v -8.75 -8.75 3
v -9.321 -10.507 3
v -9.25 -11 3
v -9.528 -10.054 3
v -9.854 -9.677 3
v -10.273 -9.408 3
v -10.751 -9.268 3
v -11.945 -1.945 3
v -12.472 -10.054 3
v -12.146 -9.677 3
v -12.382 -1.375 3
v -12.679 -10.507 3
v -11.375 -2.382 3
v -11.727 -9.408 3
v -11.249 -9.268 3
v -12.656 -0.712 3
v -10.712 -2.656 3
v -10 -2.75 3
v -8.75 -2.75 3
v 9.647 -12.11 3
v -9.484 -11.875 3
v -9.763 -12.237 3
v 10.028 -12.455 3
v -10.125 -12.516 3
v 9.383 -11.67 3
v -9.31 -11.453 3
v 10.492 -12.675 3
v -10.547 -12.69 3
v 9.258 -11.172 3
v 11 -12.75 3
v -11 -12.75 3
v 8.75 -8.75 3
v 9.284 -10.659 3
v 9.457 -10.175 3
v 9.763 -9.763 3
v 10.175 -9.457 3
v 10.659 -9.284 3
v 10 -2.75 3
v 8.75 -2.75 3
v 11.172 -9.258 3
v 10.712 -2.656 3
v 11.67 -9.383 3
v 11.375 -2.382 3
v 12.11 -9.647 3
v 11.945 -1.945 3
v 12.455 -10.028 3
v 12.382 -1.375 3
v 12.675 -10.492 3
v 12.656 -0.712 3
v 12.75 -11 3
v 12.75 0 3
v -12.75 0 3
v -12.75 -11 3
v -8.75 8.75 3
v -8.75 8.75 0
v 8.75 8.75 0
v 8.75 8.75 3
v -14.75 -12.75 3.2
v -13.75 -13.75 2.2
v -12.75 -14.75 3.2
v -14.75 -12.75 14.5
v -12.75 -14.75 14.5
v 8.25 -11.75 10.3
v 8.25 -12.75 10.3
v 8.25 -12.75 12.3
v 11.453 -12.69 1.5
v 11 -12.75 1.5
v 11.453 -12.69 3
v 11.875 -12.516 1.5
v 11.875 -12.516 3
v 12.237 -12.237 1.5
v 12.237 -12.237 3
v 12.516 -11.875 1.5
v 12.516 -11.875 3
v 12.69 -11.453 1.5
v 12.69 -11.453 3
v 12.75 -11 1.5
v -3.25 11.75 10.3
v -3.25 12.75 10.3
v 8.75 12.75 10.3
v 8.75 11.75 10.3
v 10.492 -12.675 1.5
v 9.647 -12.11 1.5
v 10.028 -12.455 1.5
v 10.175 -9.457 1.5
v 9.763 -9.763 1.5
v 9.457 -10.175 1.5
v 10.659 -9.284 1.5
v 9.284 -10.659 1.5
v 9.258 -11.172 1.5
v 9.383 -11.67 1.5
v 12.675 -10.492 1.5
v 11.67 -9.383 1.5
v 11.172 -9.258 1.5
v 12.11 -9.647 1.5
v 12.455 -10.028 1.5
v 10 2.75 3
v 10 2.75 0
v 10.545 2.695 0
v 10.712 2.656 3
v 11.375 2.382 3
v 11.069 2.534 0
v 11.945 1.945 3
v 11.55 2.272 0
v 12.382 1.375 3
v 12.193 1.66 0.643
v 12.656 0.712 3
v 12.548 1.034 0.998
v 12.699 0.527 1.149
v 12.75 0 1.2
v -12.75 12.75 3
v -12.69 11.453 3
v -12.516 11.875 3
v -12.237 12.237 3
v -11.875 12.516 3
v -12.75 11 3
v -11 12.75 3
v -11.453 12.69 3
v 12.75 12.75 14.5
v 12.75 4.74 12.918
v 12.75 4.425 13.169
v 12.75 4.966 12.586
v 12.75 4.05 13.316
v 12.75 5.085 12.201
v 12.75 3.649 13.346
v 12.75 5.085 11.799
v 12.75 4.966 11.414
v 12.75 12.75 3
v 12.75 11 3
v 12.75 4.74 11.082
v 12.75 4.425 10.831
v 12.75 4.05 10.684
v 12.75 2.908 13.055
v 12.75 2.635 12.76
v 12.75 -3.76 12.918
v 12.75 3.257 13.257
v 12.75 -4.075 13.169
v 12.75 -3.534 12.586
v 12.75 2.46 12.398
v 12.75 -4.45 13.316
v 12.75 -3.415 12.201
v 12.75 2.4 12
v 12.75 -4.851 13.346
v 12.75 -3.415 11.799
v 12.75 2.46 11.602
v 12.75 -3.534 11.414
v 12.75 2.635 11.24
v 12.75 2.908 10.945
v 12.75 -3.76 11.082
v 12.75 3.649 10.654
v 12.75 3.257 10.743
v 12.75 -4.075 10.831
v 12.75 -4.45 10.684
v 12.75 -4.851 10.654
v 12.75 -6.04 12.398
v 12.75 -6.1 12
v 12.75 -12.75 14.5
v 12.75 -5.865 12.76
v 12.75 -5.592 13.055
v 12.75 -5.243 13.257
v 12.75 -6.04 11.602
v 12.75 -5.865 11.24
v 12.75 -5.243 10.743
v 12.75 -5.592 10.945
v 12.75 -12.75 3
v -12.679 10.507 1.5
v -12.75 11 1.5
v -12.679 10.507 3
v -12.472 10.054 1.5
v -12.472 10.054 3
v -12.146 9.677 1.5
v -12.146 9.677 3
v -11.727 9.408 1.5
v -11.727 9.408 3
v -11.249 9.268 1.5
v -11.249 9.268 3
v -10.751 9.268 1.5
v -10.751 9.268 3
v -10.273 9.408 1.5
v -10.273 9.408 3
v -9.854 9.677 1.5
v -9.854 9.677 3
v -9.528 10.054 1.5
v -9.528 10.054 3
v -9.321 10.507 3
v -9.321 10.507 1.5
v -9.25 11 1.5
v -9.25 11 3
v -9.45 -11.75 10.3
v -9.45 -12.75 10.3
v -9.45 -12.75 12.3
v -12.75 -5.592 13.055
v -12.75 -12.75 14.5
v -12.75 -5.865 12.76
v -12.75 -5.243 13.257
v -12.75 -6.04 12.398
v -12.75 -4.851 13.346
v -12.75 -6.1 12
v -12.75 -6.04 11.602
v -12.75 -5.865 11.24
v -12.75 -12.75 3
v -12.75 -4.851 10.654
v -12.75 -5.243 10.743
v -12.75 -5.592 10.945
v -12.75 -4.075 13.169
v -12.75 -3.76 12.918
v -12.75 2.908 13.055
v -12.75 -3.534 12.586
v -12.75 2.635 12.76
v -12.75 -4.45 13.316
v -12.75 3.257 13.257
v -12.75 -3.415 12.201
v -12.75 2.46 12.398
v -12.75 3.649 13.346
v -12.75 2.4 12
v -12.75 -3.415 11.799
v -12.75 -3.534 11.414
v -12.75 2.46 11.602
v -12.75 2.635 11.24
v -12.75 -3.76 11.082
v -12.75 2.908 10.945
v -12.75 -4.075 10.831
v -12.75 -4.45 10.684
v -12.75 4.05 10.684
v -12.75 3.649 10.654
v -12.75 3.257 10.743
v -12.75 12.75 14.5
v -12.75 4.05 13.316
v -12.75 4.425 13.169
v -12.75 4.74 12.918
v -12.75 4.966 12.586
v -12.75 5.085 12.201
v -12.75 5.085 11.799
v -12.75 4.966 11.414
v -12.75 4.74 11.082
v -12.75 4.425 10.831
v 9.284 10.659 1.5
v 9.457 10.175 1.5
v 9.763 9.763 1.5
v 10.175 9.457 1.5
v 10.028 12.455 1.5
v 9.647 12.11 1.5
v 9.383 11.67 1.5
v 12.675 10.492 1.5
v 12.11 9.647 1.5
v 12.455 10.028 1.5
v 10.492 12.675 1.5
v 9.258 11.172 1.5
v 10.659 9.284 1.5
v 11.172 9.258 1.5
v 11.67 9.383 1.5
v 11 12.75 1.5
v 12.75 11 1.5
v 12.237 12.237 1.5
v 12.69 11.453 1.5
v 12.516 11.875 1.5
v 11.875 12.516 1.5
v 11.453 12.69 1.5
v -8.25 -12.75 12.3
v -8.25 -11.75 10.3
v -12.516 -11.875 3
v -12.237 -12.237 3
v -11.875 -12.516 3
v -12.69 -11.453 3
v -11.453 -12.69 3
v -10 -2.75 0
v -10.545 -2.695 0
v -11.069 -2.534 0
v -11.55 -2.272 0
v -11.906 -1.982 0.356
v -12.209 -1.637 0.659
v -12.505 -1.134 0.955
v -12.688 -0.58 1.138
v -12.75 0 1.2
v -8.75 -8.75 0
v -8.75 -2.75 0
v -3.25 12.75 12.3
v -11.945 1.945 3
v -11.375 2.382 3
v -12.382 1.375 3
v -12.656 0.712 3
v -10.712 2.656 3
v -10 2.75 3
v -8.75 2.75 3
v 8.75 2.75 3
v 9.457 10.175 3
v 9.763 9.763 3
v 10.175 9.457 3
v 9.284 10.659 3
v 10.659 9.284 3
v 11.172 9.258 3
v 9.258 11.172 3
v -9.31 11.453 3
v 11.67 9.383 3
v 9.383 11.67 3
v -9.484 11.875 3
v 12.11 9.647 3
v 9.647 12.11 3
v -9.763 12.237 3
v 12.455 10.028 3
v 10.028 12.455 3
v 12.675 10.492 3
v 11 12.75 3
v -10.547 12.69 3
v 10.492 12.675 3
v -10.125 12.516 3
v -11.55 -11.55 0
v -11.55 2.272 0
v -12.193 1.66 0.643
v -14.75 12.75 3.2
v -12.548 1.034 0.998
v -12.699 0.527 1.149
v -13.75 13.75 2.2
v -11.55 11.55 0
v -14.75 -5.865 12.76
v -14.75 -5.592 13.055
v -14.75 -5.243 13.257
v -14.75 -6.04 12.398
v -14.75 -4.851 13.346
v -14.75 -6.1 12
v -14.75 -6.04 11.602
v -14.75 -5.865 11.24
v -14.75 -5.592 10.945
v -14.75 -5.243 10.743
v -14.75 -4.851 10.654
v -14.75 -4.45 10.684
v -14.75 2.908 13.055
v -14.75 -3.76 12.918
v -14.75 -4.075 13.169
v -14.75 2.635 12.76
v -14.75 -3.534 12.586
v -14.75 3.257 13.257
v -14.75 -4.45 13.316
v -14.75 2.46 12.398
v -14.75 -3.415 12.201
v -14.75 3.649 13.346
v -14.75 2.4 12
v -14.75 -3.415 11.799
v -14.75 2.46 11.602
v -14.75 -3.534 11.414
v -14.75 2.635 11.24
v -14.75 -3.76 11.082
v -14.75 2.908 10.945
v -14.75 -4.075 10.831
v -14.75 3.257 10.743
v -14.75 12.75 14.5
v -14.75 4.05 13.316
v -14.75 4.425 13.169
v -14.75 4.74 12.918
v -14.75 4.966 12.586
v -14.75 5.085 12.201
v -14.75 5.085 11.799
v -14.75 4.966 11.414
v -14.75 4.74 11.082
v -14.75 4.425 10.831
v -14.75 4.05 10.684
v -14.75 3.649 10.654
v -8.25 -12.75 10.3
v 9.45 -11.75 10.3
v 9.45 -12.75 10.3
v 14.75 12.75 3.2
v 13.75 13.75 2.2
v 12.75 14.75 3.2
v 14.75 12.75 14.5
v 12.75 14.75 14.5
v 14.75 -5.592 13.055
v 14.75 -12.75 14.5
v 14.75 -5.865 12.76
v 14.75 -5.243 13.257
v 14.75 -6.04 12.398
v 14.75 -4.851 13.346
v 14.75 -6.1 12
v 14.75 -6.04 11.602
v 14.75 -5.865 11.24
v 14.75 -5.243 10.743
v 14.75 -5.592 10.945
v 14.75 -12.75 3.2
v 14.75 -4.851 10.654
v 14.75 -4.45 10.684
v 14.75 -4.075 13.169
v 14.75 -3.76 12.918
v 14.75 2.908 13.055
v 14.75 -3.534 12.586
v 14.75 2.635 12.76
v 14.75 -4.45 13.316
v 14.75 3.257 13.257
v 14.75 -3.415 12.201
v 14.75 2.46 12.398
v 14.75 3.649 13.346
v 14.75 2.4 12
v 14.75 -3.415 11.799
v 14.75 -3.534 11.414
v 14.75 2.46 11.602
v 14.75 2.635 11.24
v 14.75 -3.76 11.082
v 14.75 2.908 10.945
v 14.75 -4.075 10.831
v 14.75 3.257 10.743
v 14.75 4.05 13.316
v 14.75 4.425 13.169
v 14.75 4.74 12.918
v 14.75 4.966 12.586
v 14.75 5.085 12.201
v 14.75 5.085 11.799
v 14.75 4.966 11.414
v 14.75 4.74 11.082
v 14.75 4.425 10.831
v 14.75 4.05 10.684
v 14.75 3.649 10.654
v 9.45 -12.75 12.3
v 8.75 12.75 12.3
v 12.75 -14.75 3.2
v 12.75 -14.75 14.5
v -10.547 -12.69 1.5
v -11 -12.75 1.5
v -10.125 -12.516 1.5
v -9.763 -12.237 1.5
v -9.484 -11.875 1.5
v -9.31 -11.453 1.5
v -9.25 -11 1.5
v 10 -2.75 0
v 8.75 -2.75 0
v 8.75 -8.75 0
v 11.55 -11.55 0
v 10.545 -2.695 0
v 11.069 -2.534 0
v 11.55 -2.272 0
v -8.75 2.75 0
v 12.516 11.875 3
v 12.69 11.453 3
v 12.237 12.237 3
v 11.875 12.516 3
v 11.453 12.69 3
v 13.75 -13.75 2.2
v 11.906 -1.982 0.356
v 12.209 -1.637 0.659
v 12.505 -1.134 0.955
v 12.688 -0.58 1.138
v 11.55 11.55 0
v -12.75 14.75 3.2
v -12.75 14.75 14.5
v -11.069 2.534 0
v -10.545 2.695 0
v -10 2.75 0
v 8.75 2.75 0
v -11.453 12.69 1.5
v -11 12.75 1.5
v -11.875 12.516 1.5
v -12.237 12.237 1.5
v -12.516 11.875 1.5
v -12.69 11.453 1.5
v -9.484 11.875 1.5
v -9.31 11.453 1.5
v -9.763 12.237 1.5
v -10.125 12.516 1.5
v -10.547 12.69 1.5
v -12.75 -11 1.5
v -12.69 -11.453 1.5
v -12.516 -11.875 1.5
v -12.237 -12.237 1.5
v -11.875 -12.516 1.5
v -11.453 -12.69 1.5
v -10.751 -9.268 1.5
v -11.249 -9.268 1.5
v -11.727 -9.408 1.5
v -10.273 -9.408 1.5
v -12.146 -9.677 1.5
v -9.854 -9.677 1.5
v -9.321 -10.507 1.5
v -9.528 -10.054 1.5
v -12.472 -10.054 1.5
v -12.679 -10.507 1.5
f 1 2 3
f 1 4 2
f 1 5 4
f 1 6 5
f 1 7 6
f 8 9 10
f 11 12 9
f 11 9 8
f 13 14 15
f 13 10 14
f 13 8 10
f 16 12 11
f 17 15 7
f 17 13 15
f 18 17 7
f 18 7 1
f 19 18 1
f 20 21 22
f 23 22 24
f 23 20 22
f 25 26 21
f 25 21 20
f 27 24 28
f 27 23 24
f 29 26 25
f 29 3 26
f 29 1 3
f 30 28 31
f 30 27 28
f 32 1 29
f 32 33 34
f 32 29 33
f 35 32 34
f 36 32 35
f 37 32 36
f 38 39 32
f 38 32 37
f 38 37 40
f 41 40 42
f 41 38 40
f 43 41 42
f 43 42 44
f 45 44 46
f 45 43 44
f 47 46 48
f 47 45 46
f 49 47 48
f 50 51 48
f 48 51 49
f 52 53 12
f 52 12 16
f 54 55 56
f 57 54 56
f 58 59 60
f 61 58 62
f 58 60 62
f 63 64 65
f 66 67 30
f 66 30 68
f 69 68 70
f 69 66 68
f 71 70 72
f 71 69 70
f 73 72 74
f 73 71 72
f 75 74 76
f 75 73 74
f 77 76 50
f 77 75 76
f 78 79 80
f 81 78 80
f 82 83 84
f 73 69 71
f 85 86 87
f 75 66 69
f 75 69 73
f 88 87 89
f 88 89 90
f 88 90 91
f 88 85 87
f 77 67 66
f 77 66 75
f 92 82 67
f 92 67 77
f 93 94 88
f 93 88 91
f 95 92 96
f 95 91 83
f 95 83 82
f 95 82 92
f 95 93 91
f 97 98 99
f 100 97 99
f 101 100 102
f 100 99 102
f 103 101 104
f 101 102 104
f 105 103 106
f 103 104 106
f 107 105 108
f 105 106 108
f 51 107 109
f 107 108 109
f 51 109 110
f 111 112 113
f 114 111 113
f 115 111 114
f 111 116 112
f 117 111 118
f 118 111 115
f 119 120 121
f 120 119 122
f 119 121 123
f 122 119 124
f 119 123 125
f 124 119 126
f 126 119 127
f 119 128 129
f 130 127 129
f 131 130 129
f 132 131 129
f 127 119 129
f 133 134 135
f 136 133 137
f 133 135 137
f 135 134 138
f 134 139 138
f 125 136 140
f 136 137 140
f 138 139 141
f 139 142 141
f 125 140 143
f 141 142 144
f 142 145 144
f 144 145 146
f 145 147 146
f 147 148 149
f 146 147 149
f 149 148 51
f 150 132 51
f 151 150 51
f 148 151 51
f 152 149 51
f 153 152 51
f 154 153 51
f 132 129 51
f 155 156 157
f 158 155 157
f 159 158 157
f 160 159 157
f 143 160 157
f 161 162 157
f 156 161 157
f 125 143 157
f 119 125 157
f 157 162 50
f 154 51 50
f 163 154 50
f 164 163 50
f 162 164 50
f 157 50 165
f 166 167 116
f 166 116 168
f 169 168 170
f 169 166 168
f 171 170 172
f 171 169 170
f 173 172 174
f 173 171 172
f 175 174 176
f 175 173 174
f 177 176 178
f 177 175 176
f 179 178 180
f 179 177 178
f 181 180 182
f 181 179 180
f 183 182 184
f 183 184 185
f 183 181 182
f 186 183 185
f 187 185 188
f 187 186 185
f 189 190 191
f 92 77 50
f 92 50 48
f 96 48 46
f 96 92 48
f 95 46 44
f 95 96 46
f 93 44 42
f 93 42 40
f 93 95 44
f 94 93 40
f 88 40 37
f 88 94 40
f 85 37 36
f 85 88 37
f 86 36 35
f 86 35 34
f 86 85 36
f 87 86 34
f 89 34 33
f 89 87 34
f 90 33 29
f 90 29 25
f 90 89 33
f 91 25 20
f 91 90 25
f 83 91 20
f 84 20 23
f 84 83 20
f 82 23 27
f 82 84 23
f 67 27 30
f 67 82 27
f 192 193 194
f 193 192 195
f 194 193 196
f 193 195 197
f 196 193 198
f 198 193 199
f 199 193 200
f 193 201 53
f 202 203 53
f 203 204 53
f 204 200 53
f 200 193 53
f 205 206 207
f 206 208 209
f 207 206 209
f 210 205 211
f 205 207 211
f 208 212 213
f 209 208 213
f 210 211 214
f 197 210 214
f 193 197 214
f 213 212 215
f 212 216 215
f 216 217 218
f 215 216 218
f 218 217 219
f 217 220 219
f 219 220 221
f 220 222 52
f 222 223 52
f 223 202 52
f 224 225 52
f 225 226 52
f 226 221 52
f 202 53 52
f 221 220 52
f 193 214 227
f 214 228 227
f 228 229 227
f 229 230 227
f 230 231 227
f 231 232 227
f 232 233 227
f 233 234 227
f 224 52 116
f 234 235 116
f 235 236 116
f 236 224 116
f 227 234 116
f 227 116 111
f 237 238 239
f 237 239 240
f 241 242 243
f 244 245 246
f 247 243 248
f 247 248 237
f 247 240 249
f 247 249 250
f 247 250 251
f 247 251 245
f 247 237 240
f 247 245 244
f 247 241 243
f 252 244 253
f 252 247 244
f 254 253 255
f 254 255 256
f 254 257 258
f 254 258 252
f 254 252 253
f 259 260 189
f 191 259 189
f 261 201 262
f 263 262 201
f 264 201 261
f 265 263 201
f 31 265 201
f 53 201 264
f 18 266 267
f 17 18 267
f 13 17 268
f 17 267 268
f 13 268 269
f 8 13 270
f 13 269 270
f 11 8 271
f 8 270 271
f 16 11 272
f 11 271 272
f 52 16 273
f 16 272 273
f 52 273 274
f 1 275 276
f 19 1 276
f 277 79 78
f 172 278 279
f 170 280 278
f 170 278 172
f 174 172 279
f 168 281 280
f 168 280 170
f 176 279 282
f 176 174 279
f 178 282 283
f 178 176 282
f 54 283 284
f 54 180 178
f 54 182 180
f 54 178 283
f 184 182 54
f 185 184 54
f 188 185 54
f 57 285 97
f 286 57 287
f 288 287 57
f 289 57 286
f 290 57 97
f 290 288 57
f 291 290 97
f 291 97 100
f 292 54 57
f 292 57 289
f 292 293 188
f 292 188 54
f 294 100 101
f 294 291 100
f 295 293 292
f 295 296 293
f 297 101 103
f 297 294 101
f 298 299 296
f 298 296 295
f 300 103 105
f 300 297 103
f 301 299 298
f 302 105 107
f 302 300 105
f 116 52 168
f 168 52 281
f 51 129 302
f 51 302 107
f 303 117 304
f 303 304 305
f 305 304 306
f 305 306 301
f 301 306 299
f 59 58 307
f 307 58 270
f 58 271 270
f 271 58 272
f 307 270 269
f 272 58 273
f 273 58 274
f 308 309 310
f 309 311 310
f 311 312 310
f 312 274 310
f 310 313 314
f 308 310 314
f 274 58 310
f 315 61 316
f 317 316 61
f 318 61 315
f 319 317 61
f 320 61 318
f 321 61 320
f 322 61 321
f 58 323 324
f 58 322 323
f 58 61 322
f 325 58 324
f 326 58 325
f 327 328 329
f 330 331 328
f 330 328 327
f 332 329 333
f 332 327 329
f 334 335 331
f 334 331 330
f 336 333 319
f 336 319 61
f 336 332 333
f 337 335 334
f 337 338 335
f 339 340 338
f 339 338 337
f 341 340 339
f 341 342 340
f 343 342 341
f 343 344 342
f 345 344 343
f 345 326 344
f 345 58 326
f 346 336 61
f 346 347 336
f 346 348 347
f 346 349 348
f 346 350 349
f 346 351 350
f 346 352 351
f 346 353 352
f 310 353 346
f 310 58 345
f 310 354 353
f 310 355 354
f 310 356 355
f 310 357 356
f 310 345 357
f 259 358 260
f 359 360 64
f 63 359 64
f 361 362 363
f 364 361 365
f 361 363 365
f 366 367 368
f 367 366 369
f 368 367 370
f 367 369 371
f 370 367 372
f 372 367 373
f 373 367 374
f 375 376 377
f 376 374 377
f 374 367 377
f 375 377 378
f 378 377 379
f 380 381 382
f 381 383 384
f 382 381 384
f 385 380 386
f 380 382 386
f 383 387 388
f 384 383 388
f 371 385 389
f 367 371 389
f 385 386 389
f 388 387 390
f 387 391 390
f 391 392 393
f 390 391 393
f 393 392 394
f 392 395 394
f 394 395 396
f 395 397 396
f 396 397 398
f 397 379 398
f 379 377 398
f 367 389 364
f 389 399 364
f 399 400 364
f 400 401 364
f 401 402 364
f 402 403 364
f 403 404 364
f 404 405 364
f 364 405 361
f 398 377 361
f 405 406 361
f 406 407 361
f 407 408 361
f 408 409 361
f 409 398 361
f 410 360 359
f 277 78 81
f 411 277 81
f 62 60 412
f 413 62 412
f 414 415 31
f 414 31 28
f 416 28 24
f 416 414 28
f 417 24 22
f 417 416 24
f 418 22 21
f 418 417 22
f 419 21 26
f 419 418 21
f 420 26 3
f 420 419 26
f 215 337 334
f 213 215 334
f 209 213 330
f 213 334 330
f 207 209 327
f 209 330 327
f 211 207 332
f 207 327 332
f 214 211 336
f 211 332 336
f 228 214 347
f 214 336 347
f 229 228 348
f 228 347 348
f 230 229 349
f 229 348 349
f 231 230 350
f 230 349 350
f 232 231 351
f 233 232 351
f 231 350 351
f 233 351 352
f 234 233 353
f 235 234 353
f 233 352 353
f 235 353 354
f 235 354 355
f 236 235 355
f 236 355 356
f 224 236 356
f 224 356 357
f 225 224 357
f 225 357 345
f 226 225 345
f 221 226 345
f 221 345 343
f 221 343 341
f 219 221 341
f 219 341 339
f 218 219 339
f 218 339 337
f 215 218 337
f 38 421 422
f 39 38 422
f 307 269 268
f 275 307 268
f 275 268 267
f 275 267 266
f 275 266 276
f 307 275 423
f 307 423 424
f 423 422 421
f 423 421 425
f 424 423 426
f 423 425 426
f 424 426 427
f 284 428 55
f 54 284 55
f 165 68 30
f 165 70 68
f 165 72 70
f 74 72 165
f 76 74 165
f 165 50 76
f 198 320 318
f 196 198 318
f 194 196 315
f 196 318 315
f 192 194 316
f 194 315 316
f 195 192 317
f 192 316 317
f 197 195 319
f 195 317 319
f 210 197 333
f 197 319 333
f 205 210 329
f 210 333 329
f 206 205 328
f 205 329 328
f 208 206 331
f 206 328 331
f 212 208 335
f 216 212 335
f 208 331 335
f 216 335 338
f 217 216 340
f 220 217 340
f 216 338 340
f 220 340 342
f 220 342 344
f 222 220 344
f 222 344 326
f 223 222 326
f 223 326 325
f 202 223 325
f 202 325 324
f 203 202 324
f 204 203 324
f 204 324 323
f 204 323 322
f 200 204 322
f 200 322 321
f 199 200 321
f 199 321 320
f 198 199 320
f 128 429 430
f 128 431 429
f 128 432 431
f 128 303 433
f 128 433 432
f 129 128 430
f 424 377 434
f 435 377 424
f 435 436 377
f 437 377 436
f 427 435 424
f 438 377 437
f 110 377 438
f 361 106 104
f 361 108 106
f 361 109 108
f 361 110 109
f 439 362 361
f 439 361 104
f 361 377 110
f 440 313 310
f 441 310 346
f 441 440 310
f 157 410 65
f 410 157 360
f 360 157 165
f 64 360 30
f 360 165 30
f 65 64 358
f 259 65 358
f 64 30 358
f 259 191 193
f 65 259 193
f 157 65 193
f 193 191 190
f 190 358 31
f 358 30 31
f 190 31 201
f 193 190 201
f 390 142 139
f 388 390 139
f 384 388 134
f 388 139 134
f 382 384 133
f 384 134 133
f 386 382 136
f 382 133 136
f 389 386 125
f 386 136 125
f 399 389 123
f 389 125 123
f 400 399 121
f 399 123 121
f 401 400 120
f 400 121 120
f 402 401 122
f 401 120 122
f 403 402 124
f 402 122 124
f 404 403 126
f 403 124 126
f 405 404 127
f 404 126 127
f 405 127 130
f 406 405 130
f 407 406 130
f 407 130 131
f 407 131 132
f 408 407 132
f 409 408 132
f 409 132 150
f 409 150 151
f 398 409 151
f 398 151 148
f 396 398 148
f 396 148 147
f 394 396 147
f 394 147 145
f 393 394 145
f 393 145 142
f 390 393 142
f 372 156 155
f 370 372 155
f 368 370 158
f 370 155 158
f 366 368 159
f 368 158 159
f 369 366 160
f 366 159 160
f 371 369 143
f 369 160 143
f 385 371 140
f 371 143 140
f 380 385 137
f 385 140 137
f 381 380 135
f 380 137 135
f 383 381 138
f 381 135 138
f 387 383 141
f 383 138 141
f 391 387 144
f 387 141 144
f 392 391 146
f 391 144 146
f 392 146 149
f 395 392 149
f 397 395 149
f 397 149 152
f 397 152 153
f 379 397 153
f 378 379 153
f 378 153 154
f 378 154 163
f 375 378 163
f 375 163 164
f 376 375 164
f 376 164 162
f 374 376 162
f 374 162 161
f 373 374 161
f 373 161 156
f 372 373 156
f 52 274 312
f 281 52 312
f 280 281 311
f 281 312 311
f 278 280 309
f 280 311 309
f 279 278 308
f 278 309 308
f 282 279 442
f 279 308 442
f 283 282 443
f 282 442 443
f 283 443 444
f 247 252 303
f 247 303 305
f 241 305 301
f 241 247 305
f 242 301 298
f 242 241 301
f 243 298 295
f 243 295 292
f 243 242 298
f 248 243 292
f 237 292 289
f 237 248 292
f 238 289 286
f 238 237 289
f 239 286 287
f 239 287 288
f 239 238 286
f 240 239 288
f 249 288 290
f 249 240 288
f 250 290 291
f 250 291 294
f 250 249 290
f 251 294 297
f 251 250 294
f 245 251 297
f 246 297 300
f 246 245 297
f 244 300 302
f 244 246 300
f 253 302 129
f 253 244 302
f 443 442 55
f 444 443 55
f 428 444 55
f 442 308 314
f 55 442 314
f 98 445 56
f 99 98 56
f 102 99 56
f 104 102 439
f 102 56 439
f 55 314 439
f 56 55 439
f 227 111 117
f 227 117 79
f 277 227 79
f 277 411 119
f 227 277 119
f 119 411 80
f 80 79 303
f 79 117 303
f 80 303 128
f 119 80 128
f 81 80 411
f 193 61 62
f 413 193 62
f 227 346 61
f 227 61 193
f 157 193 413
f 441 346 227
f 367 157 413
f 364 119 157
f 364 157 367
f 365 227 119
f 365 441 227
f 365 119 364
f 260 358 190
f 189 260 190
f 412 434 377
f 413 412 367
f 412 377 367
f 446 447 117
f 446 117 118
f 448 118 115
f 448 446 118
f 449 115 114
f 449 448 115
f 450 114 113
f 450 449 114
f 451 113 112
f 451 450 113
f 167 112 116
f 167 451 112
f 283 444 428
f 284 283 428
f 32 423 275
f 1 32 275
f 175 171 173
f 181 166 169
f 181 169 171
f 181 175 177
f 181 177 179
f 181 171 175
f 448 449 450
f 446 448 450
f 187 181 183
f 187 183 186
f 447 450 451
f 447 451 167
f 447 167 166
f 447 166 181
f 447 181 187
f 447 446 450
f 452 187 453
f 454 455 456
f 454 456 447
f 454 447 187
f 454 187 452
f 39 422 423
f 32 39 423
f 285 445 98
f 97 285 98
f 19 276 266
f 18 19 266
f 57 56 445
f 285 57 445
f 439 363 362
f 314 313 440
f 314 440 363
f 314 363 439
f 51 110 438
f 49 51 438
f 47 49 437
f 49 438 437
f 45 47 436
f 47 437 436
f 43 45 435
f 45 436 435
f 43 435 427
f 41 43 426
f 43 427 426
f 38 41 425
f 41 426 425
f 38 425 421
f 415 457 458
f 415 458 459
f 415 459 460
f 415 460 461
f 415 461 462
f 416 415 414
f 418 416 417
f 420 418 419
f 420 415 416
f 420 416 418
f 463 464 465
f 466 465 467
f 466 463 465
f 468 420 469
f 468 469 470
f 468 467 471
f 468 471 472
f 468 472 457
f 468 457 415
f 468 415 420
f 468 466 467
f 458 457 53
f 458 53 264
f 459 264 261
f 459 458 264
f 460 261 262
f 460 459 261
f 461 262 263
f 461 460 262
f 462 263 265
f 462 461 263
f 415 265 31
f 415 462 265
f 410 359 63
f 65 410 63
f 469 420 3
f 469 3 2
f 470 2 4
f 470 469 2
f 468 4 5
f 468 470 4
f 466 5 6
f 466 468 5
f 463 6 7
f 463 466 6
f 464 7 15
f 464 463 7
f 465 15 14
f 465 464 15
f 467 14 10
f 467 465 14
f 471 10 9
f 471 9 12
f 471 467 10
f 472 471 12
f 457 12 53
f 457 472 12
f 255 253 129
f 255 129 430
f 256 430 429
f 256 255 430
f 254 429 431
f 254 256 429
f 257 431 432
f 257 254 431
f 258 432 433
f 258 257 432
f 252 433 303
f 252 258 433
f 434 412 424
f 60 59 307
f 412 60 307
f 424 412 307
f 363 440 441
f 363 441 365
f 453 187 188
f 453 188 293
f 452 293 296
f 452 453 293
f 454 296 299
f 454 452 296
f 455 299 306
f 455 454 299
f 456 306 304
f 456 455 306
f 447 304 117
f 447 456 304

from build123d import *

# Parameters (mm, degrees)
F1_DEPTH     = 3
F0_W         = 29.5
F0_H         = 29.5
F2_DEPTH     = 14.5
F3_DEPTH     = 3
F4_DEPTH     = 1.5
F6_W         = 12
F6_H         = 2
F7_DEPTH     = 1
F8_SIZE2     = 1.99999
F8_SIZE      = 0.99999
F9_W         = 1.2
F9_H         = 2
F10_DEPTH    = 1
F11_SIZE2    = 1.99999
F11_SIZE     = 0.99999
F12_SIZE2    = 1.99999
F12_SIZE     = 0.99999
F13_T1_DEPTH = 45.958771123
F13_T3_DEPTH = 45.958771123
F5_R         = 1.35
F14_DEPTH    = 30
F15_SIZE     = 2


# Not quite as in the source:
# - a fillet or chamfer that OpenCascade refuses, or shapes differently, is made with other operations: its cross-section is extruded or revolved along the edge and cut away or added
# - a fillet or chamfer is up to 0.001 mm smaller than in the source, because OpenCascade refuses the exact size


with BuildPart() as f1:
    # F0 (on Top) → F1 (new body)
    with BuildSketch(Plane.XY):
        with BuildLine():
            ThreePointArc((12.75, 11), (9.7625631329, 9.7625631329), (11, 12.75))
            Line((11, 12.75), (-11, 12.75))
            ThreePointArc((-11, 12.75), (-9.7625631329, 12.2374368671), (-9.25, 11))
            ThreePointArc((-9.25, 11), (-11, 9.25), (-12.75, 11))
            Line((-12.75, 11), (-12.75, -5e-10))
            ThreePointArc((-12.75, -5e-10), (-11.9445436484, 1.9445436481), (-10, 2.75))
            Line((-10, 2.75), (-8.75, 2.75))
            Line((-8.75, 2.75), (-8.75, 8.75))
            Line((-8.75, 8.75), (8.75, 8.75))
            Line((8.75, 8.75), (8.75, 2.75))
            Line((8.75, 2.75), (10, 2.75))
            ThreePointArc((10, 2.75), (11.9445436484, 1.9445436481), (12.75, -5e-10))
            Line((12.75, -5e-10), (12.75, 11))
        make_face()
        with BuildLine():
            ThreePointArc((-12.75, 11), (-12.2374368671, 12.2374368671), (-11, 12.75))
            Line((-11, 12.75), (-12.75, 12.75))
            Line((-12.75, 12.75), (-12.75, 11))
        make_face()
        with BuildLine():
            Line((12.75, 11), (12.75, 12.75))
            Line((12.75, 12.75), (11, 12.75))
            ThreePointArc((11, 12.75), (12.2374368671, 12.2374368671), (12.75, 11))
        make_face()
        with BuildLine():
            ThreePointArc((12.75, 11), (12.2374368671, 12.2374368671), (11, 12.75))
            ThreePointArc((11, 12.75), (9.7625631329, 9.7625631329), (12.75, 11))
        make_face()
        with BuildLine():
            ThreePointArc((-9.25, 11), (-9.7625631329, 12.2374368671), (-11, 12.75))
            ThreePointArc((-11, 12.75), (-12.2374368671, 12.2374368671), (-12.75, 11))
            ThreePointArc((-12.75, 11), (-11, 9.25), (-9.25, 11))
        make_face()
    extrude(amount=F1_DEPTH)



with BuildPart() as f1b:
    # F0 (on Top) → F1, piece 2 (new body)
    with BuildSketch(Plane.XY):
        with BuildLine():
            Line((12.75, -11), (12.75, -5e-10))
            ThreePointArc((12.75, -5e-10), (11.9445436481, -1.9445436484), (10, -2.75))
            Line((10, -2.75), (8.75, -2.75))
            Line((8.75, -2.75), (8.75, -8.75))
            Line((8.75, -8.75), (-8.75, -8.75))
            Line((-8.75, -8.75), (-8.75, -2.75))
            Line((-8.75, -2.75), (-10, -2.75))
            ThreePointArc((-10, -2.75), (-11.9445436481, -1.9445436484), (-12.75, -5e-10))
            Line((-12.75, -5e-10), (-12.75, -11))
            ThreePointArc((-12.75, -11), (-11, -9.25), (-9.25, -11))
            ThreePointArc((-9.25, -11), (-9.7625631329, -12.2374368671), (-11, -12.75))
            Line((-11, -12.75), (11, -12.75))
            ThreePointArc((11, -12.75), (9.7625631329, -9.7625631329), (12.75, -11))
        make_face()
        with BuildLine():
            ThreePointArc((-11, -12.75), (-12.2374368671, -12.2374368671), (-12.75, -11))
            Line((-12.75, -11), (-12.75, -12.75))
            Line((-12.75, -12.75), (-11, -12.75))
        make_face()
        with BuildLine():
            Line((12.75, -12.75), (12.75, -11))
            ThreePointArc((12.75, -11), (12.2374368671, -12.2374368671), (11, -12.75))
            Line((11, -12.75), (12.75, -12.75))
        make_face()
        with BuildLine():
            ThreePointArc((11, -12.75), (12.2374368671, -12.2374368671), (12.75, -11))
            ThreePointArc((12.75, -11), (9.7625631329, -9.7625631329), (11, -12.75))
        make_face()
        with BuildLine():
            ThreePointArc((-9.25, -11), (-11, -9.25), (-12.75, -11))
            ThreePointArc((-12.75, -11), (-12.2374368671, -12.2374368671), (-11, -12.75))
            ThreePointArc((-11, -12.75), (-9.7625631329, -12.2374368671), (-9.25, -11))
        make_face()
    extrude(amount=F1_DEPTH)


with BuildPart() as f1_1:
    add(f1.part)

    add(f1b.part)  # F2 merges F1b
    # F0 (on Top) → F2 (join)
    with BuildSketch(Plane.XY):
        Rectangle(F0_W, F0_H)
        Polygon((11, 12.75), (12.75, 12.75), (12.75, 11), (12.75, -5e-10), (12.75, -11), (12.75, -12.75), (11, -12.75), (-11, -12.75), (-12.75, -12.75), (-12.75, -11), (-12.75, -5e-10), (-12.75, 11), (-12.75, 12.75), (-11, 12.75), align=None, mode=Mode.SUBTRACT)
    extrude(amount=F2_DEPTH)

    # F0 (on Top) → F3 (cut)
    with BuildSketch(Plane.XY):
        with BuildLine():
            ThreePointArc((-9.25, 11), (-9.7625631329, 12.2374368671), (-11, 12.75))
            ThreePointArc((-11, 12.75), (-12.2374368671, 12.2374368671), (-12.75, 11))
            ThreePointArc((-12.75, 11), (-11, 9.25), (-9.25, 11))
        make_face()
        with BuildLine():
            ThreePointArc((12.75, 11), (12.2374368671, 12.2374368671), (11, 12.75))
            ThreePointArc((11, 12.75), (9.7625631329, 9.7625631329), (12.75, 11))
        make_face()
        with BuildLine():
            ThreePointArc((-9.25, -11), (-11, -9.25), (-12.75, -11))
            ThreePointArc((-12.75, -11), (-12.2374368671, -12.2374368671), (-11, -12.75))
            ThreePointArc((-11, -12.75), (-9.7625631329, -12.2374368671), (-9.25, -11))
        make_face()
        with BuildLine():
            ThreePointArc((11, -12.75), (12.2374368671, -12.2374368671), (12.75, -11))
            ThreePointArc((12.75, -11), (9.7625631329, -9.7625631329), (11, -12.75))
        make_face()
    extrude(amount=F3_DEPTH, mode=Mode.SUBTRACT)

    # F0 (on Top) → F4 (join)
    with BuildSketch(Plane.XY):
        with BuildLine():
            ThreePointArc((12.75, 11), (12.2374368671, 12.2374368671), (11, 12.75))
            ThreePointArc((11, 12.75), (9.7625631329, 9.7625631329), (12.75, 11))
        make_face()
        with BuildLine():
            ThreePointArc((-9.25, 11), (-9.7625631329, 12.2374368671), (-11, 12.75))
            ThreePointArc((-11, 12.75), (-12.2374368671, 12.2374368671), (-12.75, 11))
            ThreePointArc((-12.75, 11), (-11, 9.25), (-9.25, 11))
        make_face()
        with BuildLine():
            ThreePointArc((-9.25, -11), (-11, -9.25), (-12.75, -11))
            ThreePointArc((-12.75, -11), (-12.2374368671, -12.2374368671), (-11, -12.75))
            ThreePointArc((-11, -12.75), (-9.7625631329, -12.2374368671), (-9.25, -11))
        make_face()
        with BuildLine():
            ThreePointArc((11, -12.75), (12.2374368671, -12.2374368671), (12.75, -11))
            ThreePointArc((12.75, -11), (9.7625631329, -9.7625631329), (11, -12.75))
        make_face()
    extrude(amount=F4_DEPTH)

    # F6 (on face) → F7 (join)
    with BuildSketch(Plane.XZ.offset(-12.75)):
        with Locations((2.75, 11.3)):
            Rectangle(F6_W, F6_H)
    extrude(amount=F7_DEPTH)

    # F8 (size 1 and 2 in the source; OpenCascade refuses exactly that, so slightly less here)
    f8_edges = [f1_1.edges().sort_by_distance(p)[0] for p in [
        (2.75, 11.75, 12.3),
    ]]
    f8_side = f1_1.faces().sort_by_distance((2.75, 12.25, 12.3))[0]
    chamfer(f8_edges, length=F8_SIZE, length2=F8_SIZE2, reference=f8_side)

    # F9 (on face) → F10 (join)
    with BuildSketch(Plane(origin=(0, -12.75, 0), x_dir=(-1, 0, 0), z_dir=(0, 1, 0))):
        with Locations((-8.85, 11.3)):
            Rectangle(F9_W, F9_H)
        with Locations((8.85, 11.3)):
            Rectangle(F9_W, F9_H)
    extrude(amount=F10_DEPTH)

    # F11 (size 1 and 2 in the source; OpenCascade refuses exactly that, so slightly less here)
    f11_edges = [f1_1.edges().sort_by_distance(p)[0] for p in [
        (8.85, -11.75, 12.3),
    ]]
    f11_side = f1_1.faces().sort_by_distance((8.85, -12.25, 12.3))[0]
    chamfer(f11_edges, length=F11_SIZE, length2=F11_SIZE2, reference=f11_side)

    # F12 (size 1 and 2 in the source; OpenCascade refuses exactly that, so slightly less here)
    f12_edges = [f1_1.edges().sort_by_distance(p)[0] for p in [
        (-8.85, -11.75, 12.3),
    ]]
    f12_side = f1_1.faces().sort_by_distance((-8.85, -12.25, 12.3))[0]
    chamfer(f12_edges, length=F12_SIZE, length2=F12_SIZE2, reference=f12_side)

    # F13: chamfer of 3.2 on 4 edges, made by hand

    # F13_s2 → F13_t1 (cut)
    with BuildSketch(Plane.YZ.offset(-22.9793855615)):
        Polygon((14.75, 3.2), (11.55, 0), (14.75, 0), align=None)
        Polygon((-14.75, 3.2), (-11.55, 0), (-14.75, 0), align=None)
    extrude(amount=F13_T1_DEPTH, mode=Mode.SUBTRACT)

    # F13_s4 → F13_t3 (cut)
    with BuildSketch(Plane.XZ.offset(-22.9793855615)):
        Polygon((-14.75, 3.2), (-11.55, 0), (-14.75, 0), align=None)
        Polygon((14.75, 3.2), (11.55, 0), (14.75, 0), align=None)
    extrude(amount=F13_T3_DEPTH, mode=Mode.SUBTRACT)

    # F5 (on face) → F14 (cut)
    with BuildSketch(Plane(origin=(-14.75, 0, 0), x_dir=(0, -1, 0), z_dir=(-1, 0, 0))):
        with Locations((4.75, 12)):
            Circle(F5_R)
        with Locations((-3.75, 12)):
            Circle(F5_R)
    extrude(amount=-F14_DEPTH, mode=Mode.SUBTRACT)

    # F15
    f15_edges = [f1_1.edges().sort_by_distance(p)[0] for p in [
        (14.75, 14.75, 8.85),
        (-14.75, 14.75, 8.85),
        (14.75, -14.75, 8.85),
        (-14.75, -14.75, 8.85),
    ]]
    chamfer(f15_edges, length=F15_SIZE)


solid = f1_1.part
